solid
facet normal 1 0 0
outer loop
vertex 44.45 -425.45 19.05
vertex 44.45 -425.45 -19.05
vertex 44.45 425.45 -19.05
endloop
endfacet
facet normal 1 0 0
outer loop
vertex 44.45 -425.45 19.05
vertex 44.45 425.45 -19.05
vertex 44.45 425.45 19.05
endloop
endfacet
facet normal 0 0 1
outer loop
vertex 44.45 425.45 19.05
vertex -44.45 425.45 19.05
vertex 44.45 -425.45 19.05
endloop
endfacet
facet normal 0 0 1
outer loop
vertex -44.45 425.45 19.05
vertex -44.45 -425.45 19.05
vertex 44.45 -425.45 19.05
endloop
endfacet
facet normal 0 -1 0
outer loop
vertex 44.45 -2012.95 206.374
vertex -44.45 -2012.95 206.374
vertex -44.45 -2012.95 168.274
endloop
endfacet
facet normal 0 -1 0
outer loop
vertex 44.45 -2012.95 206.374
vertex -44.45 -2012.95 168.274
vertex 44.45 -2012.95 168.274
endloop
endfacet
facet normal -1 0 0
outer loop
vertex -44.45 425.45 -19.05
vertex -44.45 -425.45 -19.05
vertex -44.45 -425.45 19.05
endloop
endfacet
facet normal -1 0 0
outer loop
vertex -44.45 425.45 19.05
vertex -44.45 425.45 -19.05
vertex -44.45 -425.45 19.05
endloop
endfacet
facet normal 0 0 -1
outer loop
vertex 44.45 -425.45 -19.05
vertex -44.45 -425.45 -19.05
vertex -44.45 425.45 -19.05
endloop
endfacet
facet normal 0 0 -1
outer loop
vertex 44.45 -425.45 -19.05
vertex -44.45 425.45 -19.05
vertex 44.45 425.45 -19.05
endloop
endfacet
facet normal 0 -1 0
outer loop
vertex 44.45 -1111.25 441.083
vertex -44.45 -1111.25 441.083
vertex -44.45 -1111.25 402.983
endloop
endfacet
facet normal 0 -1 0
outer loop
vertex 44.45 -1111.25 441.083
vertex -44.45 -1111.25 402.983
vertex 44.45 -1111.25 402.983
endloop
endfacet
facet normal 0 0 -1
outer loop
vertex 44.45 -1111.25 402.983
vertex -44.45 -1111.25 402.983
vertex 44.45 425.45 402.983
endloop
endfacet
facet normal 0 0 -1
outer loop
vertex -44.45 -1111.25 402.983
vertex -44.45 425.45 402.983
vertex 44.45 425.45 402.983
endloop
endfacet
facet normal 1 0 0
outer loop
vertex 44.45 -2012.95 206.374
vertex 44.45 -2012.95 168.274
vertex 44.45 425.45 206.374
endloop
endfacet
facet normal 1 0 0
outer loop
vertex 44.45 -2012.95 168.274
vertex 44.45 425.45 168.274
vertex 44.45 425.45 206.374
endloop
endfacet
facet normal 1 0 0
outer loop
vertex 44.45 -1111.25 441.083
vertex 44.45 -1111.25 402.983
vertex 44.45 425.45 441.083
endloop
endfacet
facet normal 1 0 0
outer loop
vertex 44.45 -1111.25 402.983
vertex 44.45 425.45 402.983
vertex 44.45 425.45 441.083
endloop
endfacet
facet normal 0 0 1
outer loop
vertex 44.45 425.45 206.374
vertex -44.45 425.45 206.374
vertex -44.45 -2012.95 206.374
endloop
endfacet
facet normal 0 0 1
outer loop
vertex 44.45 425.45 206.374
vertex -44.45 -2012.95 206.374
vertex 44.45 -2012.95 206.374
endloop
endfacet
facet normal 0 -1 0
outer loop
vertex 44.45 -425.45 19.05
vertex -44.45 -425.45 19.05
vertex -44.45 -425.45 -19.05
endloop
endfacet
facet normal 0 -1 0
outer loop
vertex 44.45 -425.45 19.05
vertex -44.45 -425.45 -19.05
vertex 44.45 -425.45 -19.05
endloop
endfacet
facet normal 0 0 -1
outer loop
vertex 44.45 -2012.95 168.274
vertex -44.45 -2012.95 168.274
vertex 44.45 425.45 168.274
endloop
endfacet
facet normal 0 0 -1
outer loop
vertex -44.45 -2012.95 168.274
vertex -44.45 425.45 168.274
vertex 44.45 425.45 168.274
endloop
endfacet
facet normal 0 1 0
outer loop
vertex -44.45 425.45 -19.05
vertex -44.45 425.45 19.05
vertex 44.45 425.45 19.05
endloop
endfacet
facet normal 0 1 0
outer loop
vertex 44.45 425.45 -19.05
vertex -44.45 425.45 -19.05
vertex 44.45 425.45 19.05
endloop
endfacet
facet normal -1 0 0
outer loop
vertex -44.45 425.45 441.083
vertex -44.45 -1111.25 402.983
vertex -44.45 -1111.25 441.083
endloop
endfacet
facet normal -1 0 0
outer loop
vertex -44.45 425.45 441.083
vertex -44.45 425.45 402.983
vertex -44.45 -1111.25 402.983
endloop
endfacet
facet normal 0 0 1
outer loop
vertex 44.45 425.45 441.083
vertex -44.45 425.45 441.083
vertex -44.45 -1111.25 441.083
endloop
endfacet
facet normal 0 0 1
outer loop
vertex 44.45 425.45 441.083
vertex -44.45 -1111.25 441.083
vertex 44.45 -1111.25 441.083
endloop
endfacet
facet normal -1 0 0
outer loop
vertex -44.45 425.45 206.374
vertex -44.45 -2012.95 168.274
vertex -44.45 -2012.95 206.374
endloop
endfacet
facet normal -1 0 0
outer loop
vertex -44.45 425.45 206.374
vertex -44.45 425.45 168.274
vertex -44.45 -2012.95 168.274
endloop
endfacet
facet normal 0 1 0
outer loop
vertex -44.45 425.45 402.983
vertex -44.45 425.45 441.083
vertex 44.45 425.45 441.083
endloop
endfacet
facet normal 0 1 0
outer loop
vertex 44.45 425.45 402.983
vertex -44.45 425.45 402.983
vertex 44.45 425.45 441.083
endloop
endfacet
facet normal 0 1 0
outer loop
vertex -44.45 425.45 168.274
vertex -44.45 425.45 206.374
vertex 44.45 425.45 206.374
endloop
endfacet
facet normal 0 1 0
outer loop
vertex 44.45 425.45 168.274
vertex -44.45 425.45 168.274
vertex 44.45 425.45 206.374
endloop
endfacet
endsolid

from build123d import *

# Parameters (mm, degrees)
F0_W     = 88.9
F0_H     = 38.1
F1_DEPTH = 425.45
F3_DEPTH = 1587.5
F5_DEPTH = 685.8


with BuildPart() as f1:
    # F0 (on Front) → F1 (new body, symmetric)
    with BuildSketch(Plane.XZ):
        Rectangle(F0_W, F0_H)
    extrude(amount=F1_DEPTH, both=True)


with BuildPart() as f2_1:
    # F2: copy of F1
    add(f1.part.moved(Location((0, 0, 187.32351))))

    # F3 (add): a face of the model
    f3_faces = [f2_1.faces().sort_by_distance(p)[0] for p in [
        (0, -425.45, 187.32351),
    ]]
    extrude(f3_faces, amount=F3_DEPTH)


with BuildPart() as f4_1:
    # F4: copy of F1
    add(f1.part.moved(Location((0, 0, 422.03298))))

    # F5 (add): a face of the model
    f5_faces = [f4_1.faces().sort_by_distance(p)[0] for p in [
        (0, -425.45, 422.03298),
    ]]
    extrude(f5_faces, amount=F5_DEPTH)


solid = Compound([f1.part, f2_1.part, f4_1.part])
